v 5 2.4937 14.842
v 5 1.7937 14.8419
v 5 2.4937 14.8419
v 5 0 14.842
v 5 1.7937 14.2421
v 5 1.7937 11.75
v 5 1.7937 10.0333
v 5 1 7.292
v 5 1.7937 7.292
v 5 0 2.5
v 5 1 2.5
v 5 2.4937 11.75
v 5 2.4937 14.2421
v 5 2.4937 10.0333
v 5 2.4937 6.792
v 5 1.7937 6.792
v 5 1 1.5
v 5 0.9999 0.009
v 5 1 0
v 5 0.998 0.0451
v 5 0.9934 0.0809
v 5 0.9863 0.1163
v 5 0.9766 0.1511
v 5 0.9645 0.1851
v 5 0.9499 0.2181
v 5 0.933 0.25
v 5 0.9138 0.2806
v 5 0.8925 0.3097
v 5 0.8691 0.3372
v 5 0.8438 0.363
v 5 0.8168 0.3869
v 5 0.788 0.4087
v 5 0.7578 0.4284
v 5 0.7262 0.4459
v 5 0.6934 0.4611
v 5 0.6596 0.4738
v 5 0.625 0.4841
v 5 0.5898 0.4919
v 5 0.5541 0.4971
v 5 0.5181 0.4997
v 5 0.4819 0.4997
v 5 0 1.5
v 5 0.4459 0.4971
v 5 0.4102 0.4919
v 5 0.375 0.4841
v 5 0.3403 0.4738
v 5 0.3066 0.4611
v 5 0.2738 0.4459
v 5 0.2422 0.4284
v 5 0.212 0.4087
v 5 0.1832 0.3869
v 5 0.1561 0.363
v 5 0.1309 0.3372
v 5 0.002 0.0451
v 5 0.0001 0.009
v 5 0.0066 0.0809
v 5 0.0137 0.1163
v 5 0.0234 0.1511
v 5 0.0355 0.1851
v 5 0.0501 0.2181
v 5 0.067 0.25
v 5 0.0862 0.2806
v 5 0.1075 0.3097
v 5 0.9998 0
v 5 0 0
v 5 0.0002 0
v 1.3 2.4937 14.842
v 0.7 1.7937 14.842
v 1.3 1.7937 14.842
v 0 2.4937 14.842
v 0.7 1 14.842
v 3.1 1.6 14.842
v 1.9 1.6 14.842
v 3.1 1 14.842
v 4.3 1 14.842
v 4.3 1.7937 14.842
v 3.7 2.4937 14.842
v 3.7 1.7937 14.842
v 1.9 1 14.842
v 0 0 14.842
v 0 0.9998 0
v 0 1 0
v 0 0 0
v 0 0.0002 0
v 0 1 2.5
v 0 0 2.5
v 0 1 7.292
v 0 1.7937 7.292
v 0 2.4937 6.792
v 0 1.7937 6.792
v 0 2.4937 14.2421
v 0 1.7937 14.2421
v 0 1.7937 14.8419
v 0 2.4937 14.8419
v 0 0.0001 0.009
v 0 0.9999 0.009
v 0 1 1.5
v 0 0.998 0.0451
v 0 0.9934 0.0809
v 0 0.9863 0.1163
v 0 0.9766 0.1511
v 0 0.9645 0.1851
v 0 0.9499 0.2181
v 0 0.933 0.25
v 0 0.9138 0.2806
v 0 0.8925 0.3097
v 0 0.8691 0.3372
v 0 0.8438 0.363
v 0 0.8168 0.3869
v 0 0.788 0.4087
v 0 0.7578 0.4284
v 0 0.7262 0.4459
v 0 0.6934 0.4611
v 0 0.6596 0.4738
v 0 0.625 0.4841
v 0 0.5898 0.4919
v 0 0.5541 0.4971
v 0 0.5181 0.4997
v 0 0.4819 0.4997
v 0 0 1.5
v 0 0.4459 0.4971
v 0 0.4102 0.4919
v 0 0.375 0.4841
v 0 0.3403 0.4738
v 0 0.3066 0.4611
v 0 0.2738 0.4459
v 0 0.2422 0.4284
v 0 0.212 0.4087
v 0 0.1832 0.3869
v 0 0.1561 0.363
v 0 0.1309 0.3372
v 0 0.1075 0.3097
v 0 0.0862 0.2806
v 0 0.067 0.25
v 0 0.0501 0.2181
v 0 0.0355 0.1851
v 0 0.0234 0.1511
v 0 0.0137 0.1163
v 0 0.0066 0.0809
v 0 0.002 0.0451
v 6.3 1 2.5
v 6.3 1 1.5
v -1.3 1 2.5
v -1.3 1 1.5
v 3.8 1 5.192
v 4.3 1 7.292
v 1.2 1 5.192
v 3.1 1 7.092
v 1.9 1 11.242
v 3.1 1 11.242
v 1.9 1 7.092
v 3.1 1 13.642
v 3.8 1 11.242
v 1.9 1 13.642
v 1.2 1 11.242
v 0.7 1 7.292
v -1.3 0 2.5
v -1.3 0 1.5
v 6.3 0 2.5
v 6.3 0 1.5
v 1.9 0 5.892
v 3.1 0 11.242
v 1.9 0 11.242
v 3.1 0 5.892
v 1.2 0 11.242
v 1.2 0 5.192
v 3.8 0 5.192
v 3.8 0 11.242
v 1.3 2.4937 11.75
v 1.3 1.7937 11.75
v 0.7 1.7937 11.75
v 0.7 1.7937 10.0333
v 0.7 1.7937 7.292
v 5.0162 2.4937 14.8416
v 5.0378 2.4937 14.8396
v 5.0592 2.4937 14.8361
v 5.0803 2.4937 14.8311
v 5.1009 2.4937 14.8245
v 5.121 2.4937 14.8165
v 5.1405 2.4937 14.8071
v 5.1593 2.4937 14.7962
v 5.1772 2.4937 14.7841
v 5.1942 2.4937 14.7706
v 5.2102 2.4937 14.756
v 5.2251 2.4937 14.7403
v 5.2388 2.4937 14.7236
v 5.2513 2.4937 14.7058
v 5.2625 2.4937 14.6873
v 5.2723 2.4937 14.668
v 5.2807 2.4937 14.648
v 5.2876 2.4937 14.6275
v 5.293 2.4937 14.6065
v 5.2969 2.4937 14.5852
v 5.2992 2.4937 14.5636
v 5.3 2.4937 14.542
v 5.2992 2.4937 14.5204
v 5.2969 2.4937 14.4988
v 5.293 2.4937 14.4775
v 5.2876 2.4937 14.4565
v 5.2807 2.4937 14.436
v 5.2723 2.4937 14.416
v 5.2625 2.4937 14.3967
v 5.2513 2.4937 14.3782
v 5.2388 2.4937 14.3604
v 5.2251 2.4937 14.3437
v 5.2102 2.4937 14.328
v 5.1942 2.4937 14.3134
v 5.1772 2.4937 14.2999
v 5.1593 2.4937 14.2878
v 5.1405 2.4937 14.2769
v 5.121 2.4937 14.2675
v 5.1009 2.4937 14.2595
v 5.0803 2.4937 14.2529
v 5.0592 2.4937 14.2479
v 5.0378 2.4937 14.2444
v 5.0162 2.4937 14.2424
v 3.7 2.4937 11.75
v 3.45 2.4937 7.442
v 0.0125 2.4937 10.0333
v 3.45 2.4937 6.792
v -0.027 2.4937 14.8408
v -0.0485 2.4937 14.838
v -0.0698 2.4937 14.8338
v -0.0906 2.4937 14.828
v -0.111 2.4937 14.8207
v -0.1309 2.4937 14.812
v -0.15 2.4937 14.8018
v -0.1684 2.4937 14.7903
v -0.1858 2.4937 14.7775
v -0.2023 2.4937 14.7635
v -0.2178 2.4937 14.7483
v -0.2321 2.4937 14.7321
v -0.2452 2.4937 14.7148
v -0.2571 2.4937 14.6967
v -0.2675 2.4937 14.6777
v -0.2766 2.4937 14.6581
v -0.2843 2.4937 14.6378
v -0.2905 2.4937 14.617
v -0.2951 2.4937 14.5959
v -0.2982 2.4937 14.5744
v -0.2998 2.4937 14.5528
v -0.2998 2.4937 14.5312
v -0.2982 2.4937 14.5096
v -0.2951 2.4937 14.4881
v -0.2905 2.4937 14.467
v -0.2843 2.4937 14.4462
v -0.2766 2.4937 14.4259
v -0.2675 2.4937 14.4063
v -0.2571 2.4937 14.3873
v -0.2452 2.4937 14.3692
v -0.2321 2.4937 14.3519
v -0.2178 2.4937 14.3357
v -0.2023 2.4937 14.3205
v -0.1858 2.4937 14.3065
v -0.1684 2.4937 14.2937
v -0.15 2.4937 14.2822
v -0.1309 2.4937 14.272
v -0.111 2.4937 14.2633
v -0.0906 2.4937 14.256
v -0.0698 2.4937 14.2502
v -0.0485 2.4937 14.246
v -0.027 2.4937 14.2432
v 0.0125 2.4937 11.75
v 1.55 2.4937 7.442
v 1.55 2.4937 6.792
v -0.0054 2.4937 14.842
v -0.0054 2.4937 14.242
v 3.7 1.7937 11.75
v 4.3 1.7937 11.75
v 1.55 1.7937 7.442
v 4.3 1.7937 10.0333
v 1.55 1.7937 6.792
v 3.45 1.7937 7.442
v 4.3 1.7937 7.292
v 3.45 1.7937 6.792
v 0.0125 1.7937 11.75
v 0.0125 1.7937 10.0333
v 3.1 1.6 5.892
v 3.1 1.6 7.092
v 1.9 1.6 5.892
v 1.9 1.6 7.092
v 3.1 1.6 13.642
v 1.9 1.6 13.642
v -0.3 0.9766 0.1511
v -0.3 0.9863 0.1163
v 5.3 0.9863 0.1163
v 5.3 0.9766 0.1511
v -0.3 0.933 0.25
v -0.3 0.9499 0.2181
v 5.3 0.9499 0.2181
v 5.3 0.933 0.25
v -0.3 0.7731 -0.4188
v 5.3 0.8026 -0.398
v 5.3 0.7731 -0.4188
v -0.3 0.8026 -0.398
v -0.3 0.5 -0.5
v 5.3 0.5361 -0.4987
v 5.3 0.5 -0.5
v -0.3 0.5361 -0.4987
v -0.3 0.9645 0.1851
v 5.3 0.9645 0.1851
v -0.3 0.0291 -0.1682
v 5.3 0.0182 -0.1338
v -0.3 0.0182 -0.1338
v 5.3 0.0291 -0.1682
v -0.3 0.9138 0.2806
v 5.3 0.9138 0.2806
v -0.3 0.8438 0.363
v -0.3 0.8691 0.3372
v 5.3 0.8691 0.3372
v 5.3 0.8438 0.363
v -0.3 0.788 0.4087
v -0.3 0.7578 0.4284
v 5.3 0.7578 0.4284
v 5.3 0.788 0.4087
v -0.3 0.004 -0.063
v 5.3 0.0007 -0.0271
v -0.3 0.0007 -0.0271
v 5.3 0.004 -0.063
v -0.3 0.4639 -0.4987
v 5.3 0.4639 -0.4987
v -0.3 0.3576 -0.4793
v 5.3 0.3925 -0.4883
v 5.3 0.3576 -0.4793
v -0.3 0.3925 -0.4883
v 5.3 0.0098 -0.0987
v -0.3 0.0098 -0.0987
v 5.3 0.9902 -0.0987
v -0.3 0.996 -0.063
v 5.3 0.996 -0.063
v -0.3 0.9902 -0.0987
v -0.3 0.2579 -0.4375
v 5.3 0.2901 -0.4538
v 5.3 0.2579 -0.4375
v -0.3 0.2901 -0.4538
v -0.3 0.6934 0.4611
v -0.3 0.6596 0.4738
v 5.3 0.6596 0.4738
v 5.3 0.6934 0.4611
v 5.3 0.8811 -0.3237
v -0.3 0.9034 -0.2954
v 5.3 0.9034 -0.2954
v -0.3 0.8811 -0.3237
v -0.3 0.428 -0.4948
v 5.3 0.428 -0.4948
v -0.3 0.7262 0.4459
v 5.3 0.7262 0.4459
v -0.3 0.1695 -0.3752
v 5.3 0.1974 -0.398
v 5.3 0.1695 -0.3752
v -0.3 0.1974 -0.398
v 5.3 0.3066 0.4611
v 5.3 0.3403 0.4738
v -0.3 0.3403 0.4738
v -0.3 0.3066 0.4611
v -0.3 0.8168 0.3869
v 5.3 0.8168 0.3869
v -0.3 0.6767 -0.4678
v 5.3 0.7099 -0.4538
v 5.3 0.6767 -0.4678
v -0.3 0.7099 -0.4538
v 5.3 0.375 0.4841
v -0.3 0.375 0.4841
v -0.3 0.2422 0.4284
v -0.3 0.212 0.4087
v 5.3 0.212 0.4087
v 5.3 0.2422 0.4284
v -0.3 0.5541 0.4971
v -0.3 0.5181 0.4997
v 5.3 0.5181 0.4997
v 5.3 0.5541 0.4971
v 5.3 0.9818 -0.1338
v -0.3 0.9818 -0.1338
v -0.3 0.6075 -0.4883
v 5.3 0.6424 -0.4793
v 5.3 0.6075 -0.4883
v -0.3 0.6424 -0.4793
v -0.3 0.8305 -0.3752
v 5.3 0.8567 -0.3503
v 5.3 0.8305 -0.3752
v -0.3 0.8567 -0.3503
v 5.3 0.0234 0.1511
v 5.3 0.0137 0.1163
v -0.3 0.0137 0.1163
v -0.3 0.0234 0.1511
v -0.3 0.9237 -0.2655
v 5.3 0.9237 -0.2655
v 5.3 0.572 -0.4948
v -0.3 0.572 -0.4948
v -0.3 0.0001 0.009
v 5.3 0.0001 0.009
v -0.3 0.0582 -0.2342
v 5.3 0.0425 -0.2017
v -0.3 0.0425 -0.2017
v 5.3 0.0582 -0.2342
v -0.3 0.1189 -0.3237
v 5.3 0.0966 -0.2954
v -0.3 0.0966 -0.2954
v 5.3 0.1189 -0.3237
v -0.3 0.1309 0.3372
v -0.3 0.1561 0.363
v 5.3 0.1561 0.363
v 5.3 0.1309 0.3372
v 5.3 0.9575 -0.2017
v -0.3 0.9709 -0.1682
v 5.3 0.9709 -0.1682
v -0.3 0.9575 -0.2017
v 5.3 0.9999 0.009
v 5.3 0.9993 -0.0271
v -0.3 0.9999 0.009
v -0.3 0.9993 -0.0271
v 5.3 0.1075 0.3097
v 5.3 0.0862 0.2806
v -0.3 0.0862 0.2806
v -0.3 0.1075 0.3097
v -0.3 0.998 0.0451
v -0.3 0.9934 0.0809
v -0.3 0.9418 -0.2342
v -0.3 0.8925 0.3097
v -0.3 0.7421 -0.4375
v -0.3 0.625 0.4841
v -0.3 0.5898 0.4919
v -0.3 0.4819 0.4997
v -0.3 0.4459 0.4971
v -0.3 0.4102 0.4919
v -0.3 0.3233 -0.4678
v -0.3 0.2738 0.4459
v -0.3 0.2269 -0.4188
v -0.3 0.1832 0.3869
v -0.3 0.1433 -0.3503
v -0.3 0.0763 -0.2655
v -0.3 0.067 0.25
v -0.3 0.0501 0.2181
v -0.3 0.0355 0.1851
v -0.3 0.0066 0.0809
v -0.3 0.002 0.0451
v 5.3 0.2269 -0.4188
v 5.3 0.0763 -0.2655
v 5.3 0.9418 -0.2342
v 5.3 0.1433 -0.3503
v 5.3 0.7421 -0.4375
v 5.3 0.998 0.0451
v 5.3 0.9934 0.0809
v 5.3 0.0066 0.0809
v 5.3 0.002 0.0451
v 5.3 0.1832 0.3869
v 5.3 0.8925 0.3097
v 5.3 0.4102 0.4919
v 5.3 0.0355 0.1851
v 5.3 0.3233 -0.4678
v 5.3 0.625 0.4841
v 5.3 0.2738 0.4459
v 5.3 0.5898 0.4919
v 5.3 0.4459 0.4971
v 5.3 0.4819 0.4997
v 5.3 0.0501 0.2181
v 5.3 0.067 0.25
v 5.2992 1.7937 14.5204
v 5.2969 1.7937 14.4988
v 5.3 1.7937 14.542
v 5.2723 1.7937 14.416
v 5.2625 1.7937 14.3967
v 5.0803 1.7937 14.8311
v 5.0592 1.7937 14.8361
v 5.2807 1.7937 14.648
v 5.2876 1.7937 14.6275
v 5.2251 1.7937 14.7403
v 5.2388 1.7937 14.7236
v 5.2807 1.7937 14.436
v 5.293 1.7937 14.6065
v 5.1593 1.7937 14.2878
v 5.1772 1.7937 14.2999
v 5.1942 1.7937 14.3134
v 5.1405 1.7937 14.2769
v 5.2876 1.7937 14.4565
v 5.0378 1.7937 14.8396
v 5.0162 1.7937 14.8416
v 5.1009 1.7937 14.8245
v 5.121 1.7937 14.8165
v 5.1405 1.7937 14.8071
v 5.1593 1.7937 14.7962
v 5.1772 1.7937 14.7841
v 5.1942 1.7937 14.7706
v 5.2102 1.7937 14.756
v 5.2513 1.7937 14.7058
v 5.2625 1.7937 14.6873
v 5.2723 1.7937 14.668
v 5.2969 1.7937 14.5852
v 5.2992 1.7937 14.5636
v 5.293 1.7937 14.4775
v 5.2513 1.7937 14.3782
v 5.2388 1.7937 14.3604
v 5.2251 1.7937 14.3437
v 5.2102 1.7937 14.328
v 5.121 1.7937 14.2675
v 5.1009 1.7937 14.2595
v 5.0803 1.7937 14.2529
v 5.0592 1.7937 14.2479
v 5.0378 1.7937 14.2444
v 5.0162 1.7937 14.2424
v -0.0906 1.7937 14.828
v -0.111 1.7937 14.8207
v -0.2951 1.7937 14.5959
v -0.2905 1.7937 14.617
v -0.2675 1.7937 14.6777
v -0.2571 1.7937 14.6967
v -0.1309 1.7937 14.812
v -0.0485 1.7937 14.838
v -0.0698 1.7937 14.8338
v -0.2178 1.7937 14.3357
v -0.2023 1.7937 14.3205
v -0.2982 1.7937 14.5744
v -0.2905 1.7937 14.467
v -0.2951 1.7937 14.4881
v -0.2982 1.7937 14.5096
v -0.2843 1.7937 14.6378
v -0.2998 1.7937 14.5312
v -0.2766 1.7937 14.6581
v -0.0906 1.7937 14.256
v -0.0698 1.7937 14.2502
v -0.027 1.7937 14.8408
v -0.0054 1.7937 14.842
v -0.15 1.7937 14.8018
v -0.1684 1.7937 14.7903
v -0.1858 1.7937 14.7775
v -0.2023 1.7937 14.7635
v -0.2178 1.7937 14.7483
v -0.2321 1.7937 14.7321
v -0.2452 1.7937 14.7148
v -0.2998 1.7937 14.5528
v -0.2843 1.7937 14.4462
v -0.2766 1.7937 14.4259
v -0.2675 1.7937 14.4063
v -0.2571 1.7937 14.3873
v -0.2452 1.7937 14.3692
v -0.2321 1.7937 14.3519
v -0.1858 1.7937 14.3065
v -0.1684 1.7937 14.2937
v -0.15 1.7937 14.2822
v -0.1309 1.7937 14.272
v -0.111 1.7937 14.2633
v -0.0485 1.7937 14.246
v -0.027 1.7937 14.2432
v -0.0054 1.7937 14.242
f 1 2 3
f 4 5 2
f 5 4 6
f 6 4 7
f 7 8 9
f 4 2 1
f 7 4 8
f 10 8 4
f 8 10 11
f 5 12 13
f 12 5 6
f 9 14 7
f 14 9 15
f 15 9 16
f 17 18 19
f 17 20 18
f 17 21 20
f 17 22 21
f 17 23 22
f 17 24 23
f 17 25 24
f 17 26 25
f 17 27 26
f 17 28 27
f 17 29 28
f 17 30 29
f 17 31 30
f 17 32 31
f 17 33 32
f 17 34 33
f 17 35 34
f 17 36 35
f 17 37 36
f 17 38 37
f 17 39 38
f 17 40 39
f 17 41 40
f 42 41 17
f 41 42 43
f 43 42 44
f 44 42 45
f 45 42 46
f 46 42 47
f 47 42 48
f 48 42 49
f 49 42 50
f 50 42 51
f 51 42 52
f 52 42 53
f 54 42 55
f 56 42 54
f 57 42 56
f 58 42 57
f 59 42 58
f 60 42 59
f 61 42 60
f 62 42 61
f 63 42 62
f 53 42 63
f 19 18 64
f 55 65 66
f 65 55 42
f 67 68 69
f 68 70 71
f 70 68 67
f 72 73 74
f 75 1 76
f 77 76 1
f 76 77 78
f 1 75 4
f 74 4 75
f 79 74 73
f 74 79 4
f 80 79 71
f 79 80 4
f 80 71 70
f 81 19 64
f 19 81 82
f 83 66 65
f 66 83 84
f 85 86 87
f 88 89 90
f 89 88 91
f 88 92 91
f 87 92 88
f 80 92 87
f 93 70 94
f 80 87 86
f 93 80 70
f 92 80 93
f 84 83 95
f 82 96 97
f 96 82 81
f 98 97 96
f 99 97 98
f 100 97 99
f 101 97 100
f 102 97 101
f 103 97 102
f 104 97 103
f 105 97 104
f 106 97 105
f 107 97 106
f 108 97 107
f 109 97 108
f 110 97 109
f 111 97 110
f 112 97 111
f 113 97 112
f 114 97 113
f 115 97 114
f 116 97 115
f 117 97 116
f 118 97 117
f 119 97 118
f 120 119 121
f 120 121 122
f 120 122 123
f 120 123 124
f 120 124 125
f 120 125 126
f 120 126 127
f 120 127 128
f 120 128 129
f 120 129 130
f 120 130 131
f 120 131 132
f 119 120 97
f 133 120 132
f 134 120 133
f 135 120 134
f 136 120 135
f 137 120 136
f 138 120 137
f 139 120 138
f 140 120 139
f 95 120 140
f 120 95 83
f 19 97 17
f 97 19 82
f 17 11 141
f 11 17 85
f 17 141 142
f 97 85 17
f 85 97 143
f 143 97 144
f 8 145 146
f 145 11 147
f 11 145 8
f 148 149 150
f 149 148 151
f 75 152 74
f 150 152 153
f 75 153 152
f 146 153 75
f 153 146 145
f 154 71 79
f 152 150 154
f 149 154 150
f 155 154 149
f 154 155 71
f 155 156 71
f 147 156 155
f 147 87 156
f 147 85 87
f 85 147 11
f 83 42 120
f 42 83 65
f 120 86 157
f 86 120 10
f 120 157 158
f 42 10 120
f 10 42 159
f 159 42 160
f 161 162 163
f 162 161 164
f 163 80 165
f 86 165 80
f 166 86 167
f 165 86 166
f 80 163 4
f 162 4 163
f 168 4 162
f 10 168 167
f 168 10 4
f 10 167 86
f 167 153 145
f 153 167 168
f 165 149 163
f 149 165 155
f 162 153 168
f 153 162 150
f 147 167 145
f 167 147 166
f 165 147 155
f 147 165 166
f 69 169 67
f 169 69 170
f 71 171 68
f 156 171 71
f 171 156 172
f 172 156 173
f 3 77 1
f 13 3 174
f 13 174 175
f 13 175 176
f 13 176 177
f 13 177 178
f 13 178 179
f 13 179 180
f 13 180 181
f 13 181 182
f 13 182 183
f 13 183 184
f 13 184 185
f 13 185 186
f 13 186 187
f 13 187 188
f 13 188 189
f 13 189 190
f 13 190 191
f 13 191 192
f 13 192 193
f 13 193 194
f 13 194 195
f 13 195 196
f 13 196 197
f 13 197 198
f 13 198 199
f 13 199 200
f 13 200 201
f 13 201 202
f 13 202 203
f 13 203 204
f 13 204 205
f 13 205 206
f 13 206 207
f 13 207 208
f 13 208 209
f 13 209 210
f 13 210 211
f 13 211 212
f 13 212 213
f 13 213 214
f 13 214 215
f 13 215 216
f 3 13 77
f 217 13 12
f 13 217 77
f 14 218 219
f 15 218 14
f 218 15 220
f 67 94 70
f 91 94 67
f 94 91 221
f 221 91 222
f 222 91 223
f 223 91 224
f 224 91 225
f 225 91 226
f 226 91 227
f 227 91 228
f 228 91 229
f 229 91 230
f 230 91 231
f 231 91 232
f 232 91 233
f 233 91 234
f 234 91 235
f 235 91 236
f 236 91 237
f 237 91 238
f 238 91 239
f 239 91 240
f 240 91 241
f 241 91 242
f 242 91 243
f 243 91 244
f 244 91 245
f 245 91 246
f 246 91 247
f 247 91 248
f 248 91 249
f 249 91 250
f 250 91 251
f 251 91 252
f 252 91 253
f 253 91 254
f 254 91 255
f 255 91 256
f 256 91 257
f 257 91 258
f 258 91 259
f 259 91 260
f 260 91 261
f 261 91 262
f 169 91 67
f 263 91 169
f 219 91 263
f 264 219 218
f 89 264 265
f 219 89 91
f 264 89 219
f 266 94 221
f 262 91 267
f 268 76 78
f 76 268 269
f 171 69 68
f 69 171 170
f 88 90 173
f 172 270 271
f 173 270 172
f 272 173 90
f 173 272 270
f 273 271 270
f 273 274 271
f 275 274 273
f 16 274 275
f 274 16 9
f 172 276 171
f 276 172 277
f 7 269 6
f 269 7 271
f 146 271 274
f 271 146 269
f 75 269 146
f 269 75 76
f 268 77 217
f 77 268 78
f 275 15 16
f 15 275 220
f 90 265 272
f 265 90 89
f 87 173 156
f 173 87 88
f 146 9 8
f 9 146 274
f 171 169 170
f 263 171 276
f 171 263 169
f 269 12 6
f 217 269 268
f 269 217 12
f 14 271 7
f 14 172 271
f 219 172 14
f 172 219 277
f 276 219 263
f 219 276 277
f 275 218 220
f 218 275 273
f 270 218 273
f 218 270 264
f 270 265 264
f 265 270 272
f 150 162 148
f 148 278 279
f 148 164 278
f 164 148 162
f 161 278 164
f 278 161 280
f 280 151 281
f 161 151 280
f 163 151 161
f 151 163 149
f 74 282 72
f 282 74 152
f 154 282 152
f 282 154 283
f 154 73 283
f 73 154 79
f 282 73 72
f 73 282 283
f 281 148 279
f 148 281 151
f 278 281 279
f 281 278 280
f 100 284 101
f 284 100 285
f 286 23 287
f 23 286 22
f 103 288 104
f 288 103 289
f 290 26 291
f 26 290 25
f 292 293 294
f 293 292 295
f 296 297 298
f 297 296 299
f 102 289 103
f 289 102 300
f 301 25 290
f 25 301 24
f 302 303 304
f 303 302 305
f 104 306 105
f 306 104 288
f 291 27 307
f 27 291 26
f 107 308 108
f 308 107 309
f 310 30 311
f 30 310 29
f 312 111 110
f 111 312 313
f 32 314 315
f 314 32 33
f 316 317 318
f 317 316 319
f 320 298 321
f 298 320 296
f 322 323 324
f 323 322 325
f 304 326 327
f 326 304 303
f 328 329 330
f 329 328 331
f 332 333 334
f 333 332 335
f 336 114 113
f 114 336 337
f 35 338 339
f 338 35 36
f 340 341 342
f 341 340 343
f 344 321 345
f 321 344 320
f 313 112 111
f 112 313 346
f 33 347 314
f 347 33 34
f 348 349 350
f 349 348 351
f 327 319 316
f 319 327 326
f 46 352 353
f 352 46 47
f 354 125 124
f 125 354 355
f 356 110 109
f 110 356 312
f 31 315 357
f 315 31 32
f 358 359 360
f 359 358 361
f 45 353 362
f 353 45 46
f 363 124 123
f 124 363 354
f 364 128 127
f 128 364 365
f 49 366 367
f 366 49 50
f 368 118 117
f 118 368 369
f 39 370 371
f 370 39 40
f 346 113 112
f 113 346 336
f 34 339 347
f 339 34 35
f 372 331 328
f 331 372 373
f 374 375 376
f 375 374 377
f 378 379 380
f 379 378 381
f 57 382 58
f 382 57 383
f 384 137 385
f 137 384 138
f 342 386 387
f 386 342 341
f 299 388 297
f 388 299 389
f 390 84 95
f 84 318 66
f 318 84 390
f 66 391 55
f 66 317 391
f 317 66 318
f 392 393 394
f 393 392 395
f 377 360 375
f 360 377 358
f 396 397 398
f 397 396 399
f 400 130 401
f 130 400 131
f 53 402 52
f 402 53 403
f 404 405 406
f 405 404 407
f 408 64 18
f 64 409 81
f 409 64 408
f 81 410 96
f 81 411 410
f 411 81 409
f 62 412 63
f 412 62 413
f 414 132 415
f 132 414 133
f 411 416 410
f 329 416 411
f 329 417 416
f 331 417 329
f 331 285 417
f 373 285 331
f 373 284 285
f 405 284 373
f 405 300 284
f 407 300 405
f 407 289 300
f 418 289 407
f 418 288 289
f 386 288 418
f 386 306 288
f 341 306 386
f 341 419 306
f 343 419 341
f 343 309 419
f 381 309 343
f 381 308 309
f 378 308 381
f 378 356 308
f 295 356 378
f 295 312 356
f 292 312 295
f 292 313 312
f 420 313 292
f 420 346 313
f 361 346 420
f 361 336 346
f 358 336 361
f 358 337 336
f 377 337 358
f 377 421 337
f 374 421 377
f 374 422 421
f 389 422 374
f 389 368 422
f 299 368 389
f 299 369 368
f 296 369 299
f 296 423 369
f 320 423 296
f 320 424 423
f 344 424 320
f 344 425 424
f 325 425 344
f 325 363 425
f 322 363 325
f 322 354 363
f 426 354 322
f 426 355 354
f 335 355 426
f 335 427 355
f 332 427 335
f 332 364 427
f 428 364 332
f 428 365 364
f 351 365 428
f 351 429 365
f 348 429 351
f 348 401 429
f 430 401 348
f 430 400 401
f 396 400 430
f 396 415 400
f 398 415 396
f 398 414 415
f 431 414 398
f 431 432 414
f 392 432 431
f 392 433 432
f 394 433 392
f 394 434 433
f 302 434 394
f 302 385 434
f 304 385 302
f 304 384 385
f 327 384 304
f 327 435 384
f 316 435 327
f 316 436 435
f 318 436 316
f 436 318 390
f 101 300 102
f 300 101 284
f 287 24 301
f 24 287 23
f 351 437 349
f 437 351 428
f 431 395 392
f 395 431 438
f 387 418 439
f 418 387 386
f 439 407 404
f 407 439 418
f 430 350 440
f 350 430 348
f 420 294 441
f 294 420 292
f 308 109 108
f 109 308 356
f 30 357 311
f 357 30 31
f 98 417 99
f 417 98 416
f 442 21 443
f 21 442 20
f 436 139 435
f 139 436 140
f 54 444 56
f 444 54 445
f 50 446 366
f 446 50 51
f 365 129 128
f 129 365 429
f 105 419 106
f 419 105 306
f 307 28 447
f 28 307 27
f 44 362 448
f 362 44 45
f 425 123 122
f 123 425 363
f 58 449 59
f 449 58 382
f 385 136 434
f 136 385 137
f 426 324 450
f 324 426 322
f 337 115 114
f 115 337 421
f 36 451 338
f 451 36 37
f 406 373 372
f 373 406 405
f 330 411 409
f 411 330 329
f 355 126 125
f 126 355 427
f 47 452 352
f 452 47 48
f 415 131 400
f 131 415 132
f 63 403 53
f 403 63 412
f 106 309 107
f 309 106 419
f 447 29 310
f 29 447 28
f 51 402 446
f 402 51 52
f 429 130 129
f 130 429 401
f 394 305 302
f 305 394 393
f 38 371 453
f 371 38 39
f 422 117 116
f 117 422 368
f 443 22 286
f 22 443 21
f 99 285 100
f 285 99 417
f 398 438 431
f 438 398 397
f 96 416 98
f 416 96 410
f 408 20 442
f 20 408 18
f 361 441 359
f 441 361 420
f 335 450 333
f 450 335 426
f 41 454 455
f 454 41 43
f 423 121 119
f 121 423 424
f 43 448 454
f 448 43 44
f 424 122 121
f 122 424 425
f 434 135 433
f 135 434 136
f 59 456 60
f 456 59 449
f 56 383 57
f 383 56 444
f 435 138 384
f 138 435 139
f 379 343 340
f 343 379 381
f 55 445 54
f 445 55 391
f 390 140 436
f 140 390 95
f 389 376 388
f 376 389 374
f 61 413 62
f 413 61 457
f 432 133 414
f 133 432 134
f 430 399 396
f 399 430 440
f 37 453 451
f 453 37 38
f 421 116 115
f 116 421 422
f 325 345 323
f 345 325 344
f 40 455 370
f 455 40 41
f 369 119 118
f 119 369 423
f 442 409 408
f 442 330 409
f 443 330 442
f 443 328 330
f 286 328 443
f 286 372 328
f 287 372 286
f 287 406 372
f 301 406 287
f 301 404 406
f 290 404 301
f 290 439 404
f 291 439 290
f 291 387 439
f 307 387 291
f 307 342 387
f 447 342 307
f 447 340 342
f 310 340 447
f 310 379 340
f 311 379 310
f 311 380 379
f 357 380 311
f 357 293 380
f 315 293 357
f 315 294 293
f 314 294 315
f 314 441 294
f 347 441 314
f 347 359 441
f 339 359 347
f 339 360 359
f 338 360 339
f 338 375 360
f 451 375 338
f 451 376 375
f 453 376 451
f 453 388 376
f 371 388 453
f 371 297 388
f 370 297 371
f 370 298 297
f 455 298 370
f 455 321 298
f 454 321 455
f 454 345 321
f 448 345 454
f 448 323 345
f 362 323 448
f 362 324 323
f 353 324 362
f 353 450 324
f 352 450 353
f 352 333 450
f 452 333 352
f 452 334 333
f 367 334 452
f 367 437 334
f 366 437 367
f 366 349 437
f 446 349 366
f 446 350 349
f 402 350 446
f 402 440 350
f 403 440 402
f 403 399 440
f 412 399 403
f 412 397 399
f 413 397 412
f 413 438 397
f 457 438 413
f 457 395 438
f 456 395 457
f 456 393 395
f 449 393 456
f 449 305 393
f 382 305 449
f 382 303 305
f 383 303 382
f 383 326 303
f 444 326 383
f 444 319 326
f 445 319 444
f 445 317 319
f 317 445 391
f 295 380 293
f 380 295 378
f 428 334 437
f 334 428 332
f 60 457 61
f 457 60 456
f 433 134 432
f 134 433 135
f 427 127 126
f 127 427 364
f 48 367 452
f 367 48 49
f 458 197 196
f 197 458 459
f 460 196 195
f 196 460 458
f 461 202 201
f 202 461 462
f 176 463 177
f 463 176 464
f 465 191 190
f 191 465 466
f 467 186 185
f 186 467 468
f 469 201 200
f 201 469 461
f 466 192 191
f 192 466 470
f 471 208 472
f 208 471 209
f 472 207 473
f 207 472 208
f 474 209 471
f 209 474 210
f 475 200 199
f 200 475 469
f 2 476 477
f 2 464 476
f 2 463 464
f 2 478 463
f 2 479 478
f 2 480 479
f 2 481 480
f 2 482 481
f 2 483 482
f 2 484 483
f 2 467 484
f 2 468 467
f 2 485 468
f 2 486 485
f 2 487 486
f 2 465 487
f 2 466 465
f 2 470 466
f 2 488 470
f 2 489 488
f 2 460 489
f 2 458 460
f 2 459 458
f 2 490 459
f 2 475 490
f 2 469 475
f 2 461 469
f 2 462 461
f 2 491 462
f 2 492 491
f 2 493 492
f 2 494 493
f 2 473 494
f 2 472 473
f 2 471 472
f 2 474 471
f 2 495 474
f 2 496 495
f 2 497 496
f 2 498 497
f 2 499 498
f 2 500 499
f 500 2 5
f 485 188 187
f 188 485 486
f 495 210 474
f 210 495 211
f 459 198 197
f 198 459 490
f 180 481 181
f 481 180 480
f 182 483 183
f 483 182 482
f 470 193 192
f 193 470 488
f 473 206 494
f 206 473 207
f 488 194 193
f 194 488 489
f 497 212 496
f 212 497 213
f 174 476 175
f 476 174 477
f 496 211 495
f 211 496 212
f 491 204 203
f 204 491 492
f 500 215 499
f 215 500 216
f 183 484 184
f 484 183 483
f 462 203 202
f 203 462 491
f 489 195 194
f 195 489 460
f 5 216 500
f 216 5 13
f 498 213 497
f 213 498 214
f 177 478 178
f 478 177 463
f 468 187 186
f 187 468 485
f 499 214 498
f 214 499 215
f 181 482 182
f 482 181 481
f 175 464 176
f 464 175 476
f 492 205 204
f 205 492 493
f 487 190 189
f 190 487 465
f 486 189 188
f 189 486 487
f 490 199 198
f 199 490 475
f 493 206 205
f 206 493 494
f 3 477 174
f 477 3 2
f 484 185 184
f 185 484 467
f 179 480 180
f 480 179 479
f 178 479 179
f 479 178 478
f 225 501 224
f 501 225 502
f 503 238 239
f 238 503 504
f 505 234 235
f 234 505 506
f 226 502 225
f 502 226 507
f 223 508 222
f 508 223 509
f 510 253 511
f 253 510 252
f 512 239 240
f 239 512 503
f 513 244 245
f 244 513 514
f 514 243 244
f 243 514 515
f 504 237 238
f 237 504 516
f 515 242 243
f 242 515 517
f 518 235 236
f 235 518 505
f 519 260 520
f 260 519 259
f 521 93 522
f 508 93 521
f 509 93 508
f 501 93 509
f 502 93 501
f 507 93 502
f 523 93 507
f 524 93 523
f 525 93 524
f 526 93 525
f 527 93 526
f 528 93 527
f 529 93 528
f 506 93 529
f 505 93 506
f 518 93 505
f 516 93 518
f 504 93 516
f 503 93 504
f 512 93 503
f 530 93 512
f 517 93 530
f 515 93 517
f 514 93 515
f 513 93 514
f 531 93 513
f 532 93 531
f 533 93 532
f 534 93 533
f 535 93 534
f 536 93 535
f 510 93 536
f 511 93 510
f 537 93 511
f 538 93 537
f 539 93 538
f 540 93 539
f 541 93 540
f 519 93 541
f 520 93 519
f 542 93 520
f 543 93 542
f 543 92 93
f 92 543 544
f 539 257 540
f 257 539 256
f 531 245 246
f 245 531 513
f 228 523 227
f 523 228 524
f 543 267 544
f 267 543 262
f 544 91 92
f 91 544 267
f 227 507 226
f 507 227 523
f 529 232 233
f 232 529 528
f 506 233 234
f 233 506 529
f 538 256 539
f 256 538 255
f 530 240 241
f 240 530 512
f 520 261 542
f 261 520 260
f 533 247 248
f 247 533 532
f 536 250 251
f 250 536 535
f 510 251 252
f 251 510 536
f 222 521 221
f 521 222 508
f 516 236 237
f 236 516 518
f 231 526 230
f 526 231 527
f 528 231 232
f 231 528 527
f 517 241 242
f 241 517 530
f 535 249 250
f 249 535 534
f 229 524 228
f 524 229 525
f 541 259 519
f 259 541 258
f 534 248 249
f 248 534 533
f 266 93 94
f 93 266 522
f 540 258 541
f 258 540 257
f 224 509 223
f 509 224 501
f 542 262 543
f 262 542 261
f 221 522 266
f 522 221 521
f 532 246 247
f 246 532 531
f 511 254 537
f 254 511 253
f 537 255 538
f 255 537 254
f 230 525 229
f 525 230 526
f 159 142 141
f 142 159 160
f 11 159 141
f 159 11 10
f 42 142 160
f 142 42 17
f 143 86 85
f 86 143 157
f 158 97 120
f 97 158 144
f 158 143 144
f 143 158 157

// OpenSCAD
/*
    This file is part of the DodoHand project. This project aims to create 
    an open implementation of the DataHand keyboard, capable of being created
    with commercial 3D printing services.

    Copyright (C) 2013 Scott Fohey

    This program is free software: you can redistribute it and/or modify
    it under the terms of the GNU General Public License as published by
    the Free Software Foundation, either version 3 of the License, or
    (at your option) any later version.

    This program is distributed in the hope that it will be useful,
    but WITHOUT ANY WARRANTY; without even the implied warranty of
    MERCHANTABILITY or FITNESS FOR A PARTICULAR PURPOSE.  See the
    GNU General Public License for more details.

    You should have received a copy of the GNU General Public License
    along with this program.  If not, see <http://www.gnu.org/licenses/>.
*/

use <lever.scad>

include <dimensions.scad>;

lowlev(0, 0, 0, 0);
